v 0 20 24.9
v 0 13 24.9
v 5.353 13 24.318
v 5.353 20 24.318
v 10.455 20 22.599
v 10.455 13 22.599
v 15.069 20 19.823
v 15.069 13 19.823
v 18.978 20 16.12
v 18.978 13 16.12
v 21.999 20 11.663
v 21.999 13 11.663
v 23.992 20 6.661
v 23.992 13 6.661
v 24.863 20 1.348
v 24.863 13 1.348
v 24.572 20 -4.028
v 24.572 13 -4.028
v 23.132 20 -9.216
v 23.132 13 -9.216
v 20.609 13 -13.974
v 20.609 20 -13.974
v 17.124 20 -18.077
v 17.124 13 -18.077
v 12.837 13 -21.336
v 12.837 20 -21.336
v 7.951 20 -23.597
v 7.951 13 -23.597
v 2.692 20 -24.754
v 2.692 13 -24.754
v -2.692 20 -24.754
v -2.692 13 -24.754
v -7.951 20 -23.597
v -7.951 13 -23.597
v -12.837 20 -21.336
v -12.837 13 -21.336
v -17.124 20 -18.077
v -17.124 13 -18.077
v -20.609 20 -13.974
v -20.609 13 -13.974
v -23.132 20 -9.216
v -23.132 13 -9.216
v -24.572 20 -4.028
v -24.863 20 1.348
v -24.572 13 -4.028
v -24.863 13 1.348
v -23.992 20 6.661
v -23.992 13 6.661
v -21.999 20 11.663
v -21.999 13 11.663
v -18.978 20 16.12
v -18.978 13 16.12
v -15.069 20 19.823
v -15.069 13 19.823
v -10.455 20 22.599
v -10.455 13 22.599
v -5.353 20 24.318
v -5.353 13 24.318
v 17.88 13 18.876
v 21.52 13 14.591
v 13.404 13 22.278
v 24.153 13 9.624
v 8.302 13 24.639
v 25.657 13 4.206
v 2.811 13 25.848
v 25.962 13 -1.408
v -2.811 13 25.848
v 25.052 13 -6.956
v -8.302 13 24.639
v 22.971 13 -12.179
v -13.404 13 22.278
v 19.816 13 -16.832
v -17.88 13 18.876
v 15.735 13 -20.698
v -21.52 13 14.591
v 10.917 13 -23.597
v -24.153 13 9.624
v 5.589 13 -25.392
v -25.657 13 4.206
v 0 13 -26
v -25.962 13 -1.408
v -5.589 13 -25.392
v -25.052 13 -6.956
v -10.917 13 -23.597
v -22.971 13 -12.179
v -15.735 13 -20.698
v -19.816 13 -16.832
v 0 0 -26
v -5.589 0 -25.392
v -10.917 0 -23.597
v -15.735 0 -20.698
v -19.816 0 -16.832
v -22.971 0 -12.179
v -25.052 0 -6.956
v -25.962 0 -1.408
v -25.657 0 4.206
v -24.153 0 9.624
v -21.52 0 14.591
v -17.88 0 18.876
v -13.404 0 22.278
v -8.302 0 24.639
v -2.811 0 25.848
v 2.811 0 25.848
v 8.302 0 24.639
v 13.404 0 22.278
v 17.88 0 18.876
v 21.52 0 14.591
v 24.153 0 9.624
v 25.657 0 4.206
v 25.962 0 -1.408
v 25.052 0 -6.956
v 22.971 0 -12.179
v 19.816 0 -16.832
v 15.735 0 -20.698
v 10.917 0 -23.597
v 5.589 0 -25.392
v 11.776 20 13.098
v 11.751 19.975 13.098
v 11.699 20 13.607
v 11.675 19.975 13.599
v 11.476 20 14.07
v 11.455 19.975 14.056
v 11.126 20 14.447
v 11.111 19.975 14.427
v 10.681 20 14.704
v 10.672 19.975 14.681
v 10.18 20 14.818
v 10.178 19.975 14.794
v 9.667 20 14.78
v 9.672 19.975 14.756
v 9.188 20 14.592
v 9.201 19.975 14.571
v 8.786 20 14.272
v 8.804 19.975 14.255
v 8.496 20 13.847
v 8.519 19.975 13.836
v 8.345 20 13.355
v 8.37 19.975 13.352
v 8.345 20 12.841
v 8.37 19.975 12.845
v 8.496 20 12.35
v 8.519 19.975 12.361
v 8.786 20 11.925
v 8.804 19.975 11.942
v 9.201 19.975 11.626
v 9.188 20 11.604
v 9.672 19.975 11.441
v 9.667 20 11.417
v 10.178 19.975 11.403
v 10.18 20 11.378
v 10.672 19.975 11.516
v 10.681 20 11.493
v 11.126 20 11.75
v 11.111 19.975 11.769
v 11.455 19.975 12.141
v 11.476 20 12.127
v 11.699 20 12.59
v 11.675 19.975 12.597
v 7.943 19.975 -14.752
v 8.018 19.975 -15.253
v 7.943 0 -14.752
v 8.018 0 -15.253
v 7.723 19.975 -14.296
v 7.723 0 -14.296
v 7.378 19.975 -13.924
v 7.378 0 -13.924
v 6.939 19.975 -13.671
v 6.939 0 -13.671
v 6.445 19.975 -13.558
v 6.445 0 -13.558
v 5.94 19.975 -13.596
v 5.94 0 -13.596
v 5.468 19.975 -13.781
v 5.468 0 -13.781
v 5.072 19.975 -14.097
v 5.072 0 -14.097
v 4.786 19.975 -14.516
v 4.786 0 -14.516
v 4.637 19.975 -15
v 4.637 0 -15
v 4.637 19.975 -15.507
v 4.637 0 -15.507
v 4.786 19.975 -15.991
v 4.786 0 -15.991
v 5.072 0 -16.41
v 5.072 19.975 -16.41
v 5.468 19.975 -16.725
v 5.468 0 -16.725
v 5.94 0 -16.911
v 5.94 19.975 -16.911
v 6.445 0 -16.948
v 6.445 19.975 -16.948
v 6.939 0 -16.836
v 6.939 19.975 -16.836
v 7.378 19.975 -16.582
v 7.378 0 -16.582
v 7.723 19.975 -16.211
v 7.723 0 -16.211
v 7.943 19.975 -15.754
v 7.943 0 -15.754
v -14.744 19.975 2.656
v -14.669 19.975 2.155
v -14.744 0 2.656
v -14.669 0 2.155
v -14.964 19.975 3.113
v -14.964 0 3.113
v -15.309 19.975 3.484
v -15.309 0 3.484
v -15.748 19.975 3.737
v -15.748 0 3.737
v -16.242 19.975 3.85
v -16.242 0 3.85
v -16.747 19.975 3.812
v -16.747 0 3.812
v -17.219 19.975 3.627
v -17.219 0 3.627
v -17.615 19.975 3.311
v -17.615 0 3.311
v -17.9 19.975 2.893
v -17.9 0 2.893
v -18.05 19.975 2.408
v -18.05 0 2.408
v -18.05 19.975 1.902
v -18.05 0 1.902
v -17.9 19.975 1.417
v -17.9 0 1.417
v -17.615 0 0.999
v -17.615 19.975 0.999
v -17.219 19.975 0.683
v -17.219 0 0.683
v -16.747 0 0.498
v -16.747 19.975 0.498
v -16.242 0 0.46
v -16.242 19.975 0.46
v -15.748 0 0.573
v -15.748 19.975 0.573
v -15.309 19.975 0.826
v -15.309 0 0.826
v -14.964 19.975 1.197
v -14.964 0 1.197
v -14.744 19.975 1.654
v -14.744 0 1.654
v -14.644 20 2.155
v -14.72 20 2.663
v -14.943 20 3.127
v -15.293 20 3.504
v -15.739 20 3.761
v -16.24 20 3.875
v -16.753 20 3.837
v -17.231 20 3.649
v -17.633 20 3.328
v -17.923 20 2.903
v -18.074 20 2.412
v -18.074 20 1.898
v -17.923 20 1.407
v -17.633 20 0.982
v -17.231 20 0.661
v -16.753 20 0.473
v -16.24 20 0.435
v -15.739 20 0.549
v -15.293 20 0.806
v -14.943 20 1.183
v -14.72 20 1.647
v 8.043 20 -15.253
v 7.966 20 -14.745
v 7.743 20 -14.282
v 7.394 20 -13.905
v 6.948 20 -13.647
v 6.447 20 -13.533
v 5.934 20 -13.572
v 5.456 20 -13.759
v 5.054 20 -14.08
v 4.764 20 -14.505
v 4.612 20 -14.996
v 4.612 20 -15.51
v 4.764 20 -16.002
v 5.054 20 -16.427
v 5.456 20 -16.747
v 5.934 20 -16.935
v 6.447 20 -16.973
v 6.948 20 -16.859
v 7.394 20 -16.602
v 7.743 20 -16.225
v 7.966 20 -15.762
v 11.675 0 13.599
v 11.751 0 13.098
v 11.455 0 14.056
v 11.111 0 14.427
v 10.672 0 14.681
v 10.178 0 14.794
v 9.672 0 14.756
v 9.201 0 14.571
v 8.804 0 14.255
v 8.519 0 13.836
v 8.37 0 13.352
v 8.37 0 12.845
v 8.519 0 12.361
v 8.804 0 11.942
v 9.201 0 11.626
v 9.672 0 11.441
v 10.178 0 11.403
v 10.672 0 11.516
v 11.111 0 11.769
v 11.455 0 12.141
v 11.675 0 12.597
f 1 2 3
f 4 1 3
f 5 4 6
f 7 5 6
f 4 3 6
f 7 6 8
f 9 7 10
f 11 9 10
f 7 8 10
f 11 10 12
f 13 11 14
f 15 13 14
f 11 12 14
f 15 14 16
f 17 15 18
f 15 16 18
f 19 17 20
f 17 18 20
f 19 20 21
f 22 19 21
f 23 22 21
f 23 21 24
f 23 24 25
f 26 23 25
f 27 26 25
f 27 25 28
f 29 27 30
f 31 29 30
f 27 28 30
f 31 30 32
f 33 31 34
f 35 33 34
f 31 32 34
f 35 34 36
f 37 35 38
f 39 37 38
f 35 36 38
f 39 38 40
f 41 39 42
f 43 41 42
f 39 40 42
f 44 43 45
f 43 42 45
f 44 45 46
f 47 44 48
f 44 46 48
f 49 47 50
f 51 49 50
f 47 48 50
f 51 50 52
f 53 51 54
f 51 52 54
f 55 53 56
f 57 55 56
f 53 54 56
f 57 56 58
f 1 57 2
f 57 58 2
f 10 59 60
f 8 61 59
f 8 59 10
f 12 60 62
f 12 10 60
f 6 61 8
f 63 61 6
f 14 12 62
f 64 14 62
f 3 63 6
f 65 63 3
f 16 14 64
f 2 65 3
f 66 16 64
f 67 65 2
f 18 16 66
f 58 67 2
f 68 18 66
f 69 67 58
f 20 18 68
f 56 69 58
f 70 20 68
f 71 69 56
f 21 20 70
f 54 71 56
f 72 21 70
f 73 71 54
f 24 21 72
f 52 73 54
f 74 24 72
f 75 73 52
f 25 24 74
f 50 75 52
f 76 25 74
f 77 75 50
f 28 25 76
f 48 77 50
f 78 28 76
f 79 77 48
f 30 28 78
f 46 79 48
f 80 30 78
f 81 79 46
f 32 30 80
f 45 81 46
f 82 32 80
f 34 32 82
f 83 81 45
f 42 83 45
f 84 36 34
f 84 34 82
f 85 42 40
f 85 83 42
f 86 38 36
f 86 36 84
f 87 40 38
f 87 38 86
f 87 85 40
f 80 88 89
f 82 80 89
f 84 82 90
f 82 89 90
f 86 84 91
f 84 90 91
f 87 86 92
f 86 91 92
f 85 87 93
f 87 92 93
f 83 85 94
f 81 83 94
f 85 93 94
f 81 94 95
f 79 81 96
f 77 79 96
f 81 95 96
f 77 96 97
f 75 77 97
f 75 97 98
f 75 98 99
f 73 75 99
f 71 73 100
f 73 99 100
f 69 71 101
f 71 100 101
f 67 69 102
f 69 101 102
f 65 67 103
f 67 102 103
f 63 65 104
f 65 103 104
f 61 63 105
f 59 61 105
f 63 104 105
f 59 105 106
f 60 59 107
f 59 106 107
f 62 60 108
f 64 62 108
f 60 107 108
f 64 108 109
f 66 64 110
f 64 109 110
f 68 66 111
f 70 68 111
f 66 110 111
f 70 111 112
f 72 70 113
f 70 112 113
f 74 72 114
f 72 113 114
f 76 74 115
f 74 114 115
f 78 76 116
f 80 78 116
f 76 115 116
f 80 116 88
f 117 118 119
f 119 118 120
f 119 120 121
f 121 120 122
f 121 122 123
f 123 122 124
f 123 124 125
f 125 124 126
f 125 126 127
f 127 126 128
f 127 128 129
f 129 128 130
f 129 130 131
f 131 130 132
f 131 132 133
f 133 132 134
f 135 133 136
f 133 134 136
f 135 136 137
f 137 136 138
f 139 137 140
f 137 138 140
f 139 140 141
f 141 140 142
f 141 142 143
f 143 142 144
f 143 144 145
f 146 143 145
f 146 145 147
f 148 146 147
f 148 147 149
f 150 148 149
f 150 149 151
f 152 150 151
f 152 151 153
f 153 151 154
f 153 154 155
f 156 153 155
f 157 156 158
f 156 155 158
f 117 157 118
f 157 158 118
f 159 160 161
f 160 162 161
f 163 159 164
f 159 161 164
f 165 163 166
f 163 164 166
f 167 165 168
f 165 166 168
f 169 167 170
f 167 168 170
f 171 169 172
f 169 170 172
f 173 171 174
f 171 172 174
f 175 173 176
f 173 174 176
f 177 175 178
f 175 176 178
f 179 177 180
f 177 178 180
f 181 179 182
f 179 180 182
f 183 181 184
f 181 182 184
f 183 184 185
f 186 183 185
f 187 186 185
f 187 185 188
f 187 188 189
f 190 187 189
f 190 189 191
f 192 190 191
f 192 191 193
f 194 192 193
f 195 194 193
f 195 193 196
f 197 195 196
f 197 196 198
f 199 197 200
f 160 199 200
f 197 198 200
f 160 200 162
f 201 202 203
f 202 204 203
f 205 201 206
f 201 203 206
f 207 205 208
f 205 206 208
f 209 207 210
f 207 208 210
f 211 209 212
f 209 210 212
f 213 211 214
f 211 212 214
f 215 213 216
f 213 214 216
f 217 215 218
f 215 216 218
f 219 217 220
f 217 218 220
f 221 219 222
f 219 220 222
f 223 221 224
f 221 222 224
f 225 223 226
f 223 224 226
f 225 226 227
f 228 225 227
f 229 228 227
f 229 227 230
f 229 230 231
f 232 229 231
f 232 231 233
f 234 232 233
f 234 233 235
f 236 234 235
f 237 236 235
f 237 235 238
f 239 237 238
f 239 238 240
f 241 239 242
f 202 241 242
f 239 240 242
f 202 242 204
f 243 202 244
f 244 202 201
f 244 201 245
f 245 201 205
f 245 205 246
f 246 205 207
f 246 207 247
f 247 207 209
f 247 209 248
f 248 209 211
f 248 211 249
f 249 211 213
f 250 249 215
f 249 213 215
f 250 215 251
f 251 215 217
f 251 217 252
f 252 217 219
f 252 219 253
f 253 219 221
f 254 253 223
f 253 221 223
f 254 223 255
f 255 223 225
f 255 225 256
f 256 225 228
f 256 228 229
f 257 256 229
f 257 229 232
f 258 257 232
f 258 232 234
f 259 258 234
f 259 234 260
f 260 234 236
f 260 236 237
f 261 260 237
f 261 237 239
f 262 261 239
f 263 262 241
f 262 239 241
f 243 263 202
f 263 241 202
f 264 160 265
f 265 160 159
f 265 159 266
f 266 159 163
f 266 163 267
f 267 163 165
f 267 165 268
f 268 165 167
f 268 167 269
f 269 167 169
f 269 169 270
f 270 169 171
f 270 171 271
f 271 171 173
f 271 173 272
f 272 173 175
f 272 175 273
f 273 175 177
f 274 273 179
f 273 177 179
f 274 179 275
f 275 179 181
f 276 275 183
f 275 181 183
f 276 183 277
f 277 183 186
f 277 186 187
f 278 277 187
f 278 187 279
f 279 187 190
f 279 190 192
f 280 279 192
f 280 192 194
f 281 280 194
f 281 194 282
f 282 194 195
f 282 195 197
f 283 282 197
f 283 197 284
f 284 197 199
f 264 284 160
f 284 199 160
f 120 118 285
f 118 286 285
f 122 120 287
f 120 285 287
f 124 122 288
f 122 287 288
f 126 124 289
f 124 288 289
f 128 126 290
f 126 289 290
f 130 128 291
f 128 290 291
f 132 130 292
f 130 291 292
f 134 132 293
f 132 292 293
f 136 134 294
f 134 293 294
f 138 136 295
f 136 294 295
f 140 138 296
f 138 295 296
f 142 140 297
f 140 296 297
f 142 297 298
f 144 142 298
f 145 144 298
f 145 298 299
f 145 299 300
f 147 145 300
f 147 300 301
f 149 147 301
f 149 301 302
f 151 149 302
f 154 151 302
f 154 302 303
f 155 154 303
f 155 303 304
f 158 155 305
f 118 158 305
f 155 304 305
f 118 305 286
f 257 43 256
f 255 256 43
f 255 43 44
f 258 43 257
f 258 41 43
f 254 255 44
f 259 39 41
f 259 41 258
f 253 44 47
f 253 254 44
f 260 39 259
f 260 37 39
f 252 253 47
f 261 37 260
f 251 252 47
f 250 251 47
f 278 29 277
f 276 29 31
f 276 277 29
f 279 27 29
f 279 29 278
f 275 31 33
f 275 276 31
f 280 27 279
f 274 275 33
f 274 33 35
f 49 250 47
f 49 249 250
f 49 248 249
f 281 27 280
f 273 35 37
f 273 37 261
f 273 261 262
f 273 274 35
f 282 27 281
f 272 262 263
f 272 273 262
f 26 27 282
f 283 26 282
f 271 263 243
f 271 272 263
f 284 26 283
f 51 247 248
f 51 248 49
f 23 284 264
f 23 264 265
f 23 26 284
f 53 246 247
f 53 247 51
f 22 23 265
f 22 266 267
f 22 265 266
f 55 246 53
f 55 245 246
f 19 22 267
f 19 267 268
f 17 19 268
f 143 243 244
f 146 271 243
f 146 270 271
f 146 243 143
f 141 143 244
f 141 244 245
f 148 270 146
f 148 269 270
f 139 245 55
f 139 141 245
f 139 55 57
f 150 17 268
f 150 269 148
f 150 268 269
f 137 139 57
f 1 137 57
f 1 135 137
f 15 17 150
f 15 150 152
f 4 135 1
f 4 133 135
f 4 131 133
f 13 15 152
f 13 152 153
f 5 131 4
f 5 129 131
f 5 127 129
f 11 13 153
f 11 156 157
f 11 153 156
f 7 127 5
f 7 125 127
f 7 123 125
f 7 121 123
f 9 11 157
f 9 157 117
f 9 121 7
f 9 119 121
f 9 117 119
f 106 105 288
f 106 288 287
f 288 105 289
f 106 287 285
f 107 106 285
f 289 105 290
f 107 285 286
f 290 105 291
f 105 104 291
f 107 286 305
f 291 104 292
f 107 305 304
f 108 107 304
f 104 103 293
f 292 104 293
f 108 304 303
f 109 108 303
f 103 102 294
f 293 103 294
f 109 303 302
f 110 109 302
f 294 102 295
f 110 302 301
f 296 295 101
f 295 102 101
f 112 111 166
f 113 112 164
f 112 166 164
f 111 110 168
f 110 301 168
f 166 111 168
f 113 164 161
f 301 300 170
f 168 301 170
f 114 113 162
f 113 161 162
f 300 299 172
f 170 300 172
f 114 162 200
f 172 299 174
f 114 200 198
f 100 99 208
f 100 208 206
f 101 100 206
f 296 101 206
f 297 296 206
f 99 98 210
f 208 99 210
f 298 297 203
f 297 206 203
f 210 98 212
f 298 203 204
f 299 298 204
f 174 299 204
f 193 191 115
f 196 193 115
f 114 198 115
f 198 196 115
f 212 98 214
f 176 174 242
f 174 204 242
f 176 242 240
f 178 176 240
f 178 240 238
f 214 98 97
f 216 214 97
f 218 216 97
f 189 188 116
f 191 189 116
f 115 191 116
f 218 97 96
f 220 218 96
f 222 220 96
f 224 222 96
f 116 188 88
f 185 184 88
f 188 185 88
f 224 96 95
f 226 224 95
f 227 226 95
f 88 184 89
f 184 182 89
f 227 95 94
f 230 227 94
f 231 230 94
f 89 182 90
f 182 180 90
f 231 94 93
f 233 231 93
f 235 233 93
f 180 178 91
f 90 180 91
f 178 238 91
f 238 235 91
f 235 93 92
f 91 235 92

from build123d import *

# Parameters (mm, degrees)
SKETCH5_R                      = 26
BOSS_EXTRUDE3_DEPTH            = 13
SKETCH6_R                      = 24.9
BOSS_EXTRUDE4_DEPTH            = 7
M3_CLEARANCE_HOLE1_D           = 3.4
M3_CLEARANCE_HOLE1_CSINK_D     = 3.45
M3_CLEARANCE_HOLE1_CSINK_ANGLE = 90


with BuildPart() as part:
    # Sketch5 → Boss-Extrude3 (new body)
    with BuildSketch(Plane(origin=(0, 0, 0), x_dir=(-1, 0, 0), z_dir=(0, 1, 0))):
        with Locations(Location((0, 0, 0), (0, 0, 270))):
            Circle(SKETCH5_R)
    extrude(amount=BOSS_EXTRUDE3_DEPTH)

    # Sketch6 → Boss-Extrude4 (add)
    with BuildSketch(Plane(origin=(0, 13, 0), x_dir=(-1, 0, 0), z_dir=(0, 1, 0))):
        with Locations(Location((0, 0, 0), (0, 0, 90))):
            Circle(SKETCH6_R)
    extrude(amount=BOSS_EXTRUDE4_DEPTH)

    # M3 Clearance Hole1 (through all)
    with Locations(Plane(origin=(0, 20, 0), x_dir=(-1, 0, 0), z_dir=(0, 1, 0))):
        with Locations((-6.318103468, -15.253251082), (-10.050651193, 13.098263648), (16.368754661, 2.154987434)):
            CounterSinkHole(M3_CLEARANCE_HOLE1_D / 2, M3_CLEARANCE_HOLE1_CSINK_D / 2, counter_sink_angle=M3_CLEARANCE_HOLE1_CSINK_ANGLE)


solid = part.part
